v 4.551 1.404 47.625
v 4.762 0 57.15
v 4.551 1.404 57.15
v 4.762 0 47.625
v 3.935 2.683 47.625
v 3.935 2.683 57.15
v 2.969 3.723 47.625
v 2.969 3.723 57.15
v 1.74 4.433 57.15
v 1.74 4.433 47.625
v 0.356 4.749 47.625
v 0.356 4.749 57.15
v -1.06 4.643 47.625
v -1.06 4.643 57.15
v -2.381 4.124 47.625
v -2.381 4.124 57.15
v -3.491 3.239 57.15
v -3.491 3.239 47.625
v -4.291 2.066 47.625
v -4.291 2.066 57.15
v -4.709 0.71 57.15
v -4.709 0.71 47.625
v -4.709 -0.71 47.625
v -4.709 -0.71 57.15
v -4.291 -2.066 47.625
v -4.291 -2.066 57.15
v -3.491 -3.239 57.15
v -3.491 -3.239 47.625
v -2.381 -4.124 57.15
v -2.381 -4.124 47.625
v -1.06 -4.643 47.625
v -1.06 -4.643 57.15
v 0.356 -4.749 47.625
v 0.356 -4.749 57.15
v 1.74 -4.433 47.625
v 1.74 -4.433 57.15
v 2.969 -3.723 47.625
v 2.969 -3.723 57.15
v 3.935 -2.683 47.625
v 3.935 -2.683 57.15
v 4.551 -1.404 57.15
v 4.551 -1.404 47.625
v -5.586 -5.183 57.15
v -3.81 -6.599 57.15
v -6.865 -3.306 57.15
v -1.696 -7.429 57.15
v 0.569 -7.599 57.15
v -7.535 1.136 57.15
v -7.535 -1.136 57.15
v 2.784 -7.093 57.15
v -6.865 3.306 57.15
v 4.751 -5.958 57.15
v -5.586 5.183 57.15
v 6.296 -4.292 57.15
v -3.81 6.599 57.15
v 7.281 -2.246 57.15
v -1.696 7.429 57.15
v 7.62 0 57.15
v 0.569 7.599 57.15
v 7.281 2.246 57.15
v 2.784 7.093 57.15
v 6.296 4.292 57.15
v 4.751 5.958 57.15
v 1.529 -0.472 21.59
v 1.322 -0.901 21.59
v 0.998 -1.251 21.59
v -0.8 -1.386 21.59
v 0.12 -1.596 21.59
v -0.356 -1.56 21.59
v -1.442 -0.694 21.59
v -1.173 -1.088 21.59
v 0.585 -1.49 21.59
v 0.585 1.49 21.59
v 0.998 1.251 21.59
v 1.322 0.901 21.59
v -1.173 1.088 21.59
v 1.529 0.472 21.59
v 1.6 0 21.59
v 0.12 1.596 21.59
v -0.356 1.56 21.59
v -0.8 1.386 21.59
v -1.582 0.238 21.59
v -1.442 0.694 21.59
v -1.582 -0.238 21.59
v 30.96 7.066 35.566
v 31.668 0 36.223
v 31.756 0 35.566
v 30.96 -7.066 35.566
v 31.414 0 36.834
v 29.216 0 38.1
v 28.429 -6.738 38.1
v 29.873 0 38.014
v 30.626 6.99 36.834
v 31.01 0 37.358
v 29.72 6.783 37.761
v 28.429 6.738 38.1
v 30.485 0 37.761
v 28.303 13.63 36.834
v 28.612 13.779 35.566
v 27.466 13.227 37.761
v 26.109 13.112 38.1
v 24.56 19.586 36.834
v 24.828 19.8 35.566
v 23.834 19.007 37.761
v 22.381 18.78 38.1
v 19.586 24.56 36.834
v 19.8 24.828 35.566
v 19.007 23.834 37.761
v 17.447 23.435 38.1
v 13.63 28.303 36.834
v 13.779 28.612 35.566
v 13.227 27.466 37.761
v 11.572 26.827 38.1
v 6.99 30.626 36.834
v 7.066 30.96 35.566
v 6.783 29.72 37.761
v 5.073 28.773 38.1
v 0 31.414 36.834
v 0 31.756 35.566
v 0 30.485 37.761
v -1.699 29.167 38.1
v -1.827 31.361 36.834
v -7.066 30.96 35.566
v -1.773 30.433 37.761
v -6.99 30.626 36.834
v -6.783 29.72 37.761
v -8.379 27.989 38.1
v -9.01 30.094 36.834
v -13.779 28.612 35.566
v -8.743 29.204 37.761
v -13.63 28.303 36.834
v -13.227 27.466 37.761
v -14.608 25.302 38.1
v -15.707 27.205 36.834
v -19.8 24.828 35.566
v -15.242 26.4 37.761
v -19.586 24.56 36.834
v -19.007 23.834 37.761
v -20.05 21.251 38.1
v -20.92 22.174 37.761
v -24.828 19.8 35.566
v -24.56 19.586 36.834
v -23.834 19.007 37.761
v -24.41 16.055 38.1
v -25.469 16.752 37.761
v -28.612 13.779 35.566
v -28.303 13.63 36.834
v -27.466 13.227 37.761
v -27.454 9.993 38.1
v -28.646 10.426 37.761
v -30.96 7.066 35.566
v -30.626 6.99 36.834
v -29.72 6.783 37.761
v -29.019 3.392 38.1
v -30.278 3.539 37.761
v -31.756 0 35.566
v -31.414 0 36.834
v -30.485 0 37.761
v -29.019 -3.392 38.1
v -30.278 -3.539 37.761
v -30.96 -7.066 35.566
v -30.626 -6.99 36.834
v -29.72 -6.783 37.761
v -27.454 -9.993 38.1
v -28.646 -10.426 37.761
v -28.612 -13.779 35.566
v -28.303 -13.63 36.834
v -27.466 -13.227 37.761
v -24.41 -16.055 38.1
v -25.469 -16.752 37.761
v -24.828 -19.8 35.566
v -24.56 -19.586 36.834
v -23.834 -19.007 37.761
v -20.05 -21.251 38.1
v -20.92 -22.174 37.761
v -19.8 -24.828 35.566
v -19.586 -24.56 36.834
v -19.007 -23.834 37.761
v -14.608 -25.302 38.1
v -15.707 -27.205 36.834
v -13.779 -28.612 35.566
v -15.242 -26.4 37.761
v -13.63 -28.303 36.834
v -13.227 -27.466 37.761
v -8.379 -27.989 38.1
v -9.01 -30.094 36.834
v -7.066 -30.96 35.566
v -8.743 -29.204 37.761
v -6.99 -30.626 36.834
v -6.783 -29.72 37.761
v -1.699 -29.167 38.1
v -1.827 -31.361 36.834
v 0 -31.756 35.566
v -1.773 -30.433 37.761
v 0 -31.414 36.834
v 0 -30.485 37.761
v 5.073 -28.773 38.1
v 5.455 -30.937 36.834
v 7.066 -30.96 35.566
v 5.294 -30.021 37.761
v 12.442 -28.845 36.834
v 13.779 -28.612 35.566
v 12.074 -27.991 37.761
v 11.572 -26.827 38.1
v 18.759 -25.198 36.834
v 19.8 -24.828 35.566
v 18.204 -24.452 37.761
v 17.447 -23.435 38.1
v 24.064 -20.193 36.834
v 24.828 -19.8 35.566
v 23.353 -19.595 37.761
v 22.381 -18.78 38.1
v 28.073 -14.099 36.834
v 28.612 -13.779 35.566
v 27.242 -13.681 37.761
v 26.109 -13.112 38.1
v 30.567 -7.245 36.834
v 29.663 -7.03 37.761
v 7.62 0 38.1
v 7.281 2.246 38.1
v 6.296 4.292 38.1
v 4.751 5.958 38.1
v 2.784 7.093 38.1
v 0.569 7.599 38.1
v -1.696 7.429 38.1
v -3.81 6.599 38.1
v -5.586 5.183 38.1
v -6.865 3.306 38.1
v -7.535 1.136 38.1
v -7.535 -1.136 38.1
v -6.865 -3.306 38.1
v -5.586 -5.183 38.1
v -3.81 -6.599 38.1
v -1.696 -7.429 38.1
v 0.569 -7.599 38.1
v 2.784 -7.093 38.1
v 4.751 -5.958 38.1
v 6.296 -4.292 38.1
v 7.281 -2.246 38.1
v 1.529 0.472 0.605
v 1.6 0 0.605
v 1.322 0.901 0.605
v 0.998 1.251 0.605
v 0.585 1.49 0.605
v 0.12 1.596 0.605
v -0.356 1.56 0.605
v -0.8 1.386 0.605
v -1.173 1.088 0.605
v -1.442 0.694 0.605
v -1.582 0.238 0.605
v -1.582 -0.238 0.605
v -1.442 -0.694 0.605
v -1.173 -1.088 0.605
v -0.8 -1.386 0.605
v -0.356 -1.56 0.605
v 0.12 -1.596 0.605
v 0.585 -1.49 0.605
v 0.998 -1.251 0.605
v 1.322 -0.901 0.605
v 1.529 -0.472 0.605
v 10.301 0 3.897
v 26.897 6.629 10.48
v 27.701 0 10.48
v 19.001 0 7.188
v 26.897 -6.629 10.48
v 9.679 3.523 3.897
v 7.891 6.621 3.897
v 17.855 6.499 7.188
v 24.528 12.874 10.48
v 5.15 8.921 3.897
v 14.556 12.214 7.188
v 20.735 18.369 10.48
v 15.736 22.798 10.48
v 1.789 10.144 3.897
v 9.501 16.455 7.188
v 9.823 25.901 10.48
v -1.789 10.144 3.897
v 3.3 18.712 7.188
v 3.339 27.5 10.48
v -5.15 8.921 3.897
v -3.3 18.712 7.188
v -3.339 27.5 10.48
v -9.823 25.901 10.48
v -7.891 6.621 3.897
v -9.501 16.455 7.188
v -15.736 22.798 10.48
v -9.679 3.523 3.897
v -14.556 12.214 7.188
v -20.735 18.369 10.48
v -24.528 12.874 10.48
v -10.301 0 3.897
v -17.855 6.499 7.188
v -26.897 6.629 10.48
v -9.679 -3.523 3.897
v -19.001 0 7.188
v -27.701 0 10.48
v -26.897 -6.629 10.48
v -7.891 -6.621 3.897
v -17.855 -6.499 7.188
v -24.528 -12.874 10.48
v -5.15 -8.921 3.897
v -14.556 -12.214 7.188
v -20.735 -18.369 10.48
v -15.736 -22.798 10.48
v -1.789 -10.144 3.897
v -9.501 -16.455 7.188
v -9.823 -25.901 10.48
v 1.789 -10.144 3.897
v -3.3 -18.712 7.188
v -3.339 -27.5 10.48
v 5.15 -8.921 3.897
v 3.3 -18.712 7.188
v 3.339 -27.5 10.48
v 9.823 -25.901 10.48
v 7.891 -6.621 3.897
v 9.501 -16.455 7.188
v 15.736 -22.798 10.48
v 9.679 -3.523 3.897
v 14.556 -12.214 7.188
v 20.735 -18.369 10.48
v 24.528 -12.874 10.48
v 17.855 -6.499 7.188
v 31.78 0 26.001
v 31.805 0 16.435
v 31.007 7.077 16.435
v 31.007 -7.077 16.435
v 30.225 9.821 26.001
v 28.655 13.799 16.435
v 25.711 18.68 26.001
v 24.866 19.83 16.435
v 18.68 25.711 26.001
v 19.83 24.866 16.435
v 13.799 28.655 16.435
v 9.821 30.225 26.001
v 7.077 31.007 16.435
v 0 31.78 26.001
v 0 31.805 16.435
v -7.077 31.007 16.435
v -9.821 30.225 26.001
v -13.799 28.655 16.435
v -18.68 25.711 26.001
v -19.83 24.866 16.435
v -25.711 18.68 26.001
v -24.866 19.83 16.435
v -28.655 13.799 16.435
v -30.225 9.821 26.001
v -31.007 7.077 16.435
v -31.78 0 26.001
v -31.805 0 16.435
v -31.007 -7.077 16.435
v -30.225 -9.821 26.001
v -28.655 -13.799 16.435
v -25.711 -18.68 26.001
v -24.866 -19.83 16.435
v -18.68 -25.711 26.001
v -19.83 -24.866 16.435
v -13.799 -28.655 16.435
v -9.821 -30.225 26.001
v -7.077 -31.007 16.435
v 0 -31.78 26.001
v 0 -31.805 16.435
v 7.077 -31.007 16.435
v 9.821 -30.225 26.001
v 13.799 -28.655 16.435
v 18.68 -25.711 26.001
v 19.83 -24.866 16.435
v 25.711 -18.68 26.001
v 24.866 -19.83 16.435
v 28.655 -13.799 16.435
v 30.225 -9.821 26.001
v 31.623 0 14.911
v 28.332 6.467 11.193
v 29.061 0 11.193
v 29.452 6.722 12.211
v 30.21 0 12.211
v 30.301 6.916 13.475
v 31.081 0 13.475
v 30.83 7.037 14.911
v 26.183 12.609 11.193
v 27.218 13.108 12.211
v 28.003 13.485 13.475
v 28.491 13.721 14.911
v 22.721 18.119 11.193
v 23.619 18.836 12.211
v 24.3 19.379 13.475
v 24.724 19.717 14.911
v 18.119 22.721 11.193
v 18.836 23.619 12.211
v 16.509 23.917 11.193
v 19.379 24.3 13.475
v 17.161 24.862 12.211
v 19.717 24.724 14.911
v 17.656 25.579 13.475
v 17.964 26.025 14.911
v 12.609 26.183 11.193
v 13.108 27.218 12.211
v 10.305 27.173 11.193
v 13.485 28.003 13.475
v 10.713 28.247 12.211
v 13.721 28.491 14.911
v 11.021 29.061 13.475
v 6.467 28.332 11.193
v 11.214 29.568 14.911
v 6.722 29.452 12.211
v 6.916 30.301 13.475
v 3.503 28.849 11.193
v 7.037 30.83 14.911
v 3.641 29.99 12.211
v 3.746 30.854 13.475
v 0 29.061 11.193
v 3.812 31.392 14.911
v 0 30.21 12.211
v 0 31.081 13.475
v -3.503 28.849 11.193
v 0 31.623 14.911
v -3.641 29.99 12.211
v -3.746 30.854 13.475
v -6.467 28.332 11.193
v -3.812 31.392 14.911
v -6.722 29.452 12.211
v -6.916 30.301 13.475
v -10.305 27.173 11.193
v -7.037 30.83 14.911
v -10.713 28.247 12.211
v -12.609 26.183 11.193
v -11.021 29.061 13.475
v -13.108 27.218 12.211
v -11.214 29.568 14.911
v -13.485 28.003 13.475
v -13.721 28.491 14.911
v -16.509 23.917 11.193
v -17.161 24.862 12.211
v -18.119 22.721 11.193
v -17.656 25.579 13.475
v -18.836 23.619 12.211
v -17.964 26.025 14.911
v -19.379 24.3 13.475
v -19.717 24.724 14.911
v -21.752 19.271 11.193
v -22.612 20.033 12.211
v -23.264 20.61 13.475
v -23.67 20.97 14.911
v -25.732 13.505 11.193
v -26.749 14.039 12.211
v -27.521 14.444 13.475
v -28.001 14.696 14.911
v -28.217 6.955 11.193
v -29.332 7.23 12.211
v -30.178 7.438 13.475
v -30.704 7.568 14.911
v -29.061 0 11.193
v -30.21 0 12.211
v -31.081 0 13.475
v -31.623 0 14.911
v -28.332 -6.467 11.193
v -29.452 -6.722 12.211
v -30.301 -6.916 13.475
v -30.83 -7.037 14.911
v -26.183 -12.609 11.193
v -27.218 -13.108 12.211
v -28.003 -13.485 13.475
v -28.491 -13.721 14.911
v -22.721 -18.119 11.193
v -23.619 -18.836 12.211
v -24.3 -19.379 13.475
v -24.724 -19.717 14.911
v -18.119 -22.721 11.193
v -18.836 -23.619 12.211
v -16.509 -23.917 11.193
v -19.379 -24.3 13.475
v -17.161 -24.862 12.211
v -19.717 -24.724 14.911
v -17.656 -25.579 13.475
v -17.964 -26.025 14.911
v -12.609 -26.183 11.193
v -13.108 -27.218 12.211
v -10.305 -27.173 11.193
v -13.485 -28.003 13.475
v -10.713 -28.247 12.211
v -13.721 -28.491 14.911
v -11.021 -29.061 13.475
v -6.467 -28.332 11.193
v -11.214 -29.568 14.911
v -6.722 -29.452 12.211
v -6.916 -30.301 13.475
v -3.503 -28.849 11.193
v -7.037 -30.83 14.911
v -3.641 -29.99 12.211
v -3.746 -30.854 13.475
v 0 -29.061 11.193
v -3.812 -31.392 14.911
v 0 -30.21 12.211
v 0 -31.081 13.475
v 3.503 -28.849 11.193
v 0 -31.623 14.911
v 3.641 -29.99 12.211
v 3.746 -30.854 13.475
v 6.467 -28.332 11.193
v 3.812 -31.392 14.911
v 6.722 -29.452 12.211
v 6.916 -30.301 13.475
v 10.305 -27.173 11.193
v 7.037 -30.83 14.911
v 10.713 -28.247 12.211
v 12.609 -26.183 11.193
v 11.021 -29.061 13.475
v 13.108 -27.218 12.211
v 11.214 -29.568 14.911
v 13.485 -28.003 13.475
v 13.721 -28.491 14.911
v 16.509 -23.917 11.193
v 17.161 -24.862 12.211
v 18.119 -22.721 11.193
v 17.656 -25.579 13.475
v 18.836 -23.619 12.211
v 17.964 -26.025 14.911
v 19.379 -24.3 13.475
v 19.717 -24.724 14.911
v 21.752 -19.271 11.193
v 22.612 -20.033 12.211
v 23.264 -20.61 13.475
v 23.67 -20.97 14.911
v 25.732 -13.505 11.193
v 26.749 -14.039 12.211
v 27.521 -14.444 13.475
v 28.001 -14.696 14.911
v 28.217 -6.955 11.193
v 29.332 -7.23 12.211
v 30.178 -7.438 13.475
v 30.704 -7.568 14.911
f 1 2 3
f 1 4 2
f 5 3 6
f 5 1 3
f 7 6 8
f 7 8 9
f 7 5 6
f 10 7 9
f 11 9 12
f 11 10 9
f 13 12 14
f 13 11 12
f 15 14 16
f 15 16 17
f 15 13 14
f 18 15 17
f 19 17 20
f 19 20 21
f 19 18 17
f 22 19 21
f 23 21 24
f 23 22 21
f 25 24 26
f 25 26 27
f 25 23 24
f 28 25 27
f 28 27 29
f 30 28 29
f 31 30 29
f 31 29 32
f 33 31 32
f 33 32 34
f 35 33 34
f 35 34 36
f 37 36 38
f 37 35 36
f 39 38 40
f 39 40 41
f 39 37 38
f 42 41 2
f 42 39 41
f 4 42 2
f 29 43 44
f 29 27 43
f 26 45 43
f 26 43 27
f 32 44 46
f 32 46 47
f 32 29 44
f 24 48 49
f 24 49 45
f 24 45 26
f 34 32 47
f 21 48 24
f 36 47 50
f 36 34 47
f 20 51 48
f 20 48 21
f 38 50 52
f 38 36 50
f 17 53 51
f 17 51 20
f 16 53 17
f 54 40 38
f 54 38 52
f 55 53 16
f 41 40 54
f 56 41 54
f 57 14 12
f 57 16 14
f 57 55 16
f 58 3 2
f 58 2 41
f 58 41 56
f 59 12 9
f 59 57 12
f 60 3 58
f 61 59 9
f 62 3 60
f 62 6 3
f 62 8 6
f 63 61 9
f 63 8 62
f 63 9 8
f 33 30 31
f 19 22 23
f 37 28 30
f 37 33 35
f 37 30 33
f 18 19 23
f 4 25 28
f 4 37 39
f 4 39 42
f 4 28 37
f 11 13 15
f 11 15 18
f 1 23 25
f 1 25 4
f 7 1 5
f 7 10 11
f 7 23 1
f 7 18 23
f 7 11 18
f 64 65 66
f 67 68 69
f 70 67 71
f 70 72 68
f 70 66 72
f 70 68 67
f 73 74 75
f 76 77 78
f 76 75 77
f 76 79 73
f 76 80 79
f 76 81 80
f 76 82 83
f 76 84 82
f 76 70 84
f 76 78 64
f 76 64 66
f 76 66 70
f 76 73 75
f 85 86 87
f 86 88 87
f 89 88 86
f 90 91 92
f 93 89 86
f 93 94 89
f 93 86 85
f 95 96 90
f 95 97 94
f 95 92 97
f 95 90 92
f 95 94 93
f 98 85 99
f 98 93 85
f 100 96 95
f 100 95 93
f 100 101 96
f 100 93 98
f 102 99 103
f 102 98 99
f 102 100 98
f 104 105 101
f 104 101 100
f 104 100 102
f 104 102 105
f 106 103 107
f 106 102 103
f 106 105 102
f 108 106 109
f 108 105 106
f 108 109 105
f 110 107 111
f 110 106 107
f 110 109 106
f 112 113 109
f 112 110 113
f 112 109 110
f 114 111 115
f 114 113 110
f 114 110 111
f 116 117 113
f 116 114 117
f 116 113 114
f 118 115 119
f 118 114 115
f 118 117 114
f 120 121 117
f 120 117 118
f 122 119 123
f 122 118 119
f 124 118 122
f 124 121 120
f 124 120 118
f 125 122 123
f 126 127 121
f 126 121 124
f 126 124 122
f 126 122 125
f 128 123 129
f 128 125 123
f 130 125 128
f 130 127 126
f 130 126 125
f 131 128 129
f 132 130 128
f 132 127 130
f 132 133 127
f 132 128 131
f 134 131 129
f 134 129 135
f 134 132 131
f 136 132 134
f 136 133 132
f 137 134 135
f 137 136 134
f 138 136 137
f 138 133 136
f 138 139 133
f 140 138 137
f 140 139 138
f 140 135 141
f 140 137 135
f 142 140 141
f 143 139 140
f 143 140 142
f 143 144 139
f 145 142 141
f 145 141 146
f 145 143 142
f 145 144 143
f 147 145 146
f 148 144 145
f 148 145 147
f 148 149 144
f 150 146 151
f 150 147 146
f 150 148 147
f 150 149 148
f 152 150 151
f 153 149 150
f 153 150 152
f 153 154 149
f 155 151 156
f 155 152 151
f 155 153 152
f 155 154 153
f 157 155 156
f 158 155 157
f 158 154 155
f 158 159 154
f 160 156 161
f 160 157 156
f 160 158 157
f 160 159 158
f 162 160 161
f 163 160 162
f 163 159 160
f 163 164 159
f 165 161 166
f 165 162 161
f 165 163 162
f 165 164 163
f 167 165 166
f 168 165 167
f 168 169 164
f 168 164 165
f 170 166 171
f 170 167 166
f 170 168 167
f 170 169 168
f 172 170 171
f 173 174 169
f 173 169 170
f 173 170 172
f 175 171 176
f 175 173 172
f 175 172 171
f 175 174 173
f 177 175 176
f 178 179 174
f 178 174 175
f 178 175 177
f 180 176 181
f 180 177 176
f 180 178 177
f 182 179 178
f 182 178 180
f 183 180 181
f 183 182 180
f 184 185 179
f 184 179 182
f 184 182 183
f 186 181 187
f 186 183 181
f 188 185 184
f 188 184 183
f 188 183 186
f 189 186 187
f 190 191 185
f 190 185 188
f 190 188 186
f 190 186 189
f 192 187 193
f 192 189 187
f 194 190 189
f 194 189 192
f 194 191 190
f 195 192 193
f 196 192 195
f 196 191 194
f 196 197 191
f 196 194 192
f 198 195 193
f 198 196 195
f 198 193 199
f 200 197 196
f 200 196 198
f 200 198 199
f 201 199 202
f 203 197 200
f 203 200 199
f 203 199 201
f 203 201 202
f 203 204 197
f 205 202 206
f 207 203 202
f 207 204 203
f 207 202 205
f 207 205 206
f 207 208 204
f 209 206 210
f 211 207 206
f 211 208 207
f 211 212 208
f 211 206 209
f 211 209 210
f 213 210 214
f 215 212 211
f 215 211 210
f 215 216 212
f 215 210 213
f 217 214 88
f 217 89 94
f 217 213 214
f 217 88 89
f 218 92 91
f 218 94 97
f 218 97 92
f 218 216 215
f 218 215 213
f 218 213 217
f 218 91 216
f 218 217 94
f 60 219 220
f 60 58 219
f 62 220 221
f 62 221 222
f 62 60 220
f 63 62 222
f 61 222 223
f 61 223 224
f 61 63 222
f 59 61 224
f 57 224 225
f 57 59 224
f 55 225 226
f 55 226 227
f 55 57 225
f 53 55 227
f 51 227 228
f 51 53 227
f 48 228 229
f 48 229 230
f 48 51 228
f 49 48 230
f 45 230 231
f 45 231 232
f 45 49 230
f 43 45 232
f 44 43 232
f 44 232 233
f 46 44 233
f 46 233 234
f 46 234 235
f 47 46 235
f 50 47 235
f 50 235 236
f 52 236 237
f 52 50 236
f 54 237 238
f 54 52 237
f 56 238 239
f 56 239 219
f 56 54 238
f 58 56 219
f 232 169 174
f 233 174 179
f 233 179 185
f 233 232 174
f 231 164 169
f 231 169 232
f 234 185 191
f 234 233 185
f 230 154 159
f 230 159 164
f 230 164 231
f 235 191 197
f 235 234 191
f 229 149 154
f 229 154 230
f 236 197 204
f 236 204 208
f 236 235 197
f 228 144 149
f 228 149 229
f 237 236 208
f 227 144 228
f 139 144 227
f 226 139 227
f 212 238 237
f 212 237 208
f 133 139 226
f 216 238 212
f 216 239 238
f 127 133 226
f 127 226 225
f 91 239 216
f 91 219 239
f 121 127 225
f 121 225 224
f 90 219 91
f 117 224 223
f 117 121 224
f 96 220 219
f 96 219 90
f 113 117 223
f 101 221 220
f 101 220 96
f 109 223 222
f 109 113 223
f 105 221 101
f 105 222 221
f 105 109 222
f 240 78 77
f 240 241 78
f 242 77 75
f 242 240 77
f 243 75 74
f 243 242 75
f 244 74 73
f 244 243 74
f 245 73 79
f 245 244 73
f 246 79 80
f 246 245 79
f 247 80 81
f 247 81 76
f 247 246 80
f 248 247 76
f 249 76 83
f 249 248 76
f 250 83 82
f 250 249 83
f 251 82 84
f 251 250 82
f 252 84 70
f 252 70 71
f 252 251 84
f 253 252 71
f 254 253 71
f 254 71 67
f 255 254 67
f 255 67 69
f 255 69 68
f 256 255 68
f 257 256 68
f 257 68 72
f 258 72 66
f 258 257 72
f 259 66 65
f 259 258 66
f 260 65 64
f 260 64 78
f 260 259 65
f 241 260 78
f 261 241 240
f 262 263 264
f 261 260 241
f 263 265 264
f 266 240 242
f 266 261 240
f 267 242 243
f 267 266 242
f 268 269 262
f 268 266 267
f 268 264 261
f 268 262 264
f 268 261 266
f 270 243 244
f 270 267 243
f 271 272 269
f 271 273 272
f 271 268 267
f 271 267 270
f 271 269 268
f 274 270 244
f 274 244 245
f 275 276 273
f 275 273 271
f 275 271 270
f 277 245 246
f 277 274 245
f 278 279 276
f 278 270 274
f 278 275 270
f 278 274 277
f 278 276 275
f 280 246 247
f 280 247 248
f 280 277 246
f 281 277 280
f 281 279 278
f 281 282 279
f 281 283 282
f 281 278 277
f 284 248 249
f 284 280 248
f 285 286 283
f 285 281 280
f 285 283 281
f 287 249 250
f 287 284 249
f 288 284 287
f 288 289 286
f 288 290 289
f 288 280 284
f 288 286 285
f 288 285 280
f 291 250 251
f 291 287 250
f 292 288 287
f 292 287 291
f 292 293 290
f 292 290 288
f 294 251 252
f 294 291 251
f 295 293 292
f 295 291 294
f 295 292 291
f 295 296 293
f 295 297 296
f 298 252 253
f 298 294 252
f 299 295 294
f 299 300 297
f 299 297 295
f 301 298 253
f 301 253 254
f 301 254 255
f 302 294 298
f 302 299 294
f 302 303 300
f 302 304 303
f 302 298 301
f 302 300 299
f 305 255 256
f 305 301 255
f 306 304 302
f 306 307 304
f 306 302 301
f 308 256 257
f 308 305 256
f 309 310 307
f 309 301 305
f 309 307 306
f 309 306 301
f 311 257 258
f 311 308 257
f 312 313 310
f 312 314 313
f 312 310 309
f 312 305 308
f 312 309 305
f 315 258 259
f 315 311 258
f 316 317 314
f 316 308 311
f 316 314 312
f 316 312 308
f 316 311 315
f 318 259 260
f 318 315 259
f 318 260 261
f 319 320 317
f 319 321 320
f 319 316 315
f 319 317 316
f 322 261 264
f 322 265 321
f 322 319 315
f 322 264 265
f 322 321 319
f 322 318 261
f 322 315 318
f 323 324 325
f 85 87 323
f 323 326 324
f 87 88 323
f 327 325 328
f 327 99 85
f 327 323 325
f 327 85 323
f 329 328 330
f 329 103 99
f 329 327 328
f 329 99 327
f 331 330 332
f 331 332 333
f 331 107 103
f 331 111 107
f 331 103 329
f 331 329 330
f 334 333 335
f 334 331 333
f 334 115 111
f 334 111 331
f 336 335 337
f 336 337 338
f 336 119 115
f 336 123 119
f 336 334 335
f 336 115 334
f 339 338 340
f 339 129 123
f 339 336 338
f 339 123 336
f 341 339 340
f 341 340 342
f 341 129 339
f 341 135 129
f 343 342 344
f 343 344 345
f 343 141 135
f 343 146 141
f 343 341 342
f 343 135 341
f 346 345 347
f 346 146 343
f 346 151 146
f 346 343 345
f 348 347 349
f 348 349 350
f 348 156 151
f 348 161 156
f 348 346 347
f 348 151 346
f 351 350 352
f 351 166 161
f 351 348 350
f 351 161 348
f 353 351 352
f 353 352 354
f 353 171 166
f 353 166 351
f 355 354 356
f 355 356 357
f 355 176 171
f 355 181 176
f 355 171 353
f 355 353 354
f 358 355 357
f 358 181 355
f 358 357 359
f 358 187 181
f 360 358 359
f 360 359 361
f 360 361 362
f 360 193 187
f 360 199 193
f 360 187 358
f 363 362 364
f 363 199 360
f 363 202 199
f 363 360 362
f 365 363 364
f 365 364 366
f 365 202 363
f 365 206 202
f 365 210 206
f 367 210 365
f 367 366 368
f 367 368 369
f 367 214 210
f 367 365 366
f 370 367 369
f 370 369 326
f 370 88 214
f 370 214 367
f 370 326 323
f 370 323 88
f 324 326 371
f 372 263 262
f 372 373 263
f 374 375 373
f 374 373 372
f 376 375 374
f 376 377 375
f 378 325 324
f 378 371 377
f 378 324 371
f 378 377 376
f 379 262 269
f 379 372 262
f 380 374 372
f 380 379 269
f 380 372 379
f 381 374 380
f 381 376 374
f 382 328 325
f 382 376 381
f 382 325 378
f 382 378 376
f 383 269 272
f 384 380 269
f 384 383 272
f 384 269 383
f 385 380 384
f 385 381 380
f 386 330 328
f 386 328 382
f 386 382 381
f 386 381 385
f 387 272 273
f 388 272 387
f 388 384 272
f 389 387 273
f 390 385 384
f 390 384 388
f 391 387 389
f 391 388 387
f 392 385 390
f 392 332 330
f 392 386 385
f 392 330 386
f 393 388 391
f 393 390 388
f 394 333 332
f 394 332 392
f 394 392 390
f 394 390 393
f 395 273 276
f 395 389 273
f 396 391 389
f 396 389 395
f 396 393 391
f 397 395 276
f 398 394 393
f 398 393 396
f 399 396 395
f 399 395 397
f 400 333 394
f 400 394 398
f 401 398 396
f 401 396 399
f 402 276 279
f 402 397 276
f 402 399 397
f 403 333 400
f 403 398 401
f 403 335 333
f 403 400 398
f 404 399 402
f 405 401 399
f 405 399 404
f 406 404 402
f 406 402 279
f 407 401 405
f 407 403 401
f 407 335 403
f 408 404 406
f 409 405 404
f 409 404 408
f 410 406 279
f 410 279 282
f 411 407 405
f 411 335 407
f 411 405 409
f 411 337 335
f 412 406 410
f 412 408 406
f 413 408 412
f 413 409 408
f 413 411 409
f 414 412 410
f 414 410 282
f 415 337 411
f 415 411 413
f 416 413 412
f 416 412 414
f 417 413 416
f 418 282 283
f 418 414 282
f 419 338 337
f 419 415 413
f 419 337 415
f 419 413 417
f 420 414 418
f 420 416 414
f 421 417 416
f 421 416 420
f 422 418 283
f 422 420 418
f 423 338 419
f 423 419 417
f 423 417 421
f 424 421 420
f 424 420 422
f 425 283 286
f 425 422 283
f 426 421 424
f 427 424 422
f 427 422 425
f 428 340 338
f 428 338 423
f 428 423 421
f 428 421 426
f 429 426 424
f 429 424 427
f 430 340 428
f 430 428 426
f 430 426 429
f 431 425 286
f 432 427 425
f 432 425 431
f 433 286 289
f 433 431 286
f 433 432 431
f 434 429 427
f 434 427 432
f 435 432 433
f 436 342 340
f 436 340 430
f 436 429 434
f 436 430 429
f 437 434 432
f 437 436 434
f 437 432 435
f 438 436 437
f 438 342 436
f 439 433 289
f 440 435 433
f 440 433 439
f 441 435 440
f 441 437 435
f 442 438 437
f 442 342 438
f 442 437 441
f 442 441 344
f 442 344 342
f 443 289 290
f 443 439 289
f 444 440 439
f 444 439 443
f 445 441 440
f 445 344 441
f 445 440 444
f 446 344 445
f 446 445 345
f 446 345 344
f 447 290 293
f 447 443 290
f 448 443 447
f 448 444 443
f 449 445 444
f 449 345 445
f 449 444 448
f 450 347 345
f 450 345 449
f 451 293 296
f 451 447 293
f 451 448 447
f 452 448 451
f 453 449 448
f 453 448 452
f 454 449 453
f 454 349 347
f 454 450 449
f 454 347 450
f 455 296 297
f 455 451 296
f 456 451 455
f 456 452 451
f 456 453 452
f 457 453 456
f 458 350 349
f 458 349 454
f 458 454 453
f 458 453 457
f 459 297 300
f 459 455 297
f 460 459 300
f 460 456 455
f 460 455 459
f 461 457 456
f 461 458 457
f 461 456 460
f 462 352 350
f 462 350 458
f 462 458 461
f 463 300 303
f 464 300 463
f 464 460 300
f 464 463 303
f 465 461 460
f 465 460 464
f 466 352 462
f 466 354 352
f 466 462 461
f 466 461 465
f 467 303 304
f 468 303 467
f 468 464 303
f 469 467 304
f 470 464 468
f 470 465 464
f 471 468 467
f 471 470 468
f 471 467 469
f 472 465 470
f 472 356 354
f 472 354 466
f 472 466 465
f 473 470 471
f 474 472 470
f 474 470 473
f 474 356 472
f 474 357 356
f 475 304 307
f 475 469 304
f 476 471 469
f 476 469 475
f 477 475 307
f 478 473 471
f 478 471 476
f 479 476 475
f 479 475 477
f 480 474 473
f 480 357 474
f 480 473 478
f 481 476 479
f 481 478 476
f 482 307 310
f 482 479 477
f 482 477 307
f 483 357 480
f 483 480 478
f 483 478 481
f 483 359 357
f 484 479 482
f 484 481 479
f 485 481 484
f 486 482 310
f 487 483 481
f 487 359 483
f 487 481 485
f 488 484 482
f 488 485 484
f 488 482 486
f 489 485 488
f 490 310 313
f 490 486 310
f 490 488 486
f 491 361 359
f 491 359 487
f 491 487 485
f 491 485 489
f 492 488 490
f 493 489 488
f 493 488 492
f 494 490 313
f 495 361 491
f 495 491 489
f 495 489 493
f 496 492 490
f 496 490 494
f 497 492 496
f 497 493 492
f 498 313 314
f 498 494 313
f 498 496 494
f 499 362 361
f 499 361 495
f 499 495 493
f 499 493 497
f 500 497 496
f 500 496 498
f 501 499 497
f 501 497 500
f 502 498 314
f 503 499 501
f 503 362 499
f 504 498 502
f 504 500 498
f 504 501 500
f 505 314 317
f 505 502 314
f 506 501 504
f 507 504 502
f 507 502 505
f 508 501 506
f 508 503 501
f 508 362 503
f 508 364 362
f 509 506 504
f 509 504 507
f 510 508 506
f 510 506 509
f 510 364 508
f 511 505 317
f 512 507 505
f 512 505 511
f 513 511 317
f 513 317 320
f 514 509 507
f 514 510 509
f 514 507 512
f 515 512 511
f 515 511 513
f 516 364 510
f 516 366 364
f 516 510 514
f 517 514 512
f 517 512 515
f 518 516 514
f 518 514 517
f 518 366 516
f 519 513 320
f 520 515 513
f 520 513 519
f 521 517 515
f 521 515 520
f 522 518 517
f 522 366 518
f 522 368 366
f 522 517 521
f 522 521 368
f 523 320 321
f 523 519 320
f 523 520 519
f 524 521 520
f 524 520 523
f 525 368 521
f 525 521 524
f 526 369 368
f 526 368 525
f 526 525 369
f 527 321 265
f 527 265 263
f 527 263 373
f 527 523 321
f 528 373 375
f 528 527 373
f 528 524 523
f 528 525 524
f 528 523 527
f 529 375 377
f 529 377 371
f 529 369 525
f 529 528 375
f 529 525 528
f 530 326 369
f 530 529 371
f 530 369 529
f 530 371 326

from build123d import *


# Not quite as in the source:
# - a feature names something its author has since deleted; it is built from what else it names


with BuildPart() as f1:
    # F0 (on Front) → F1 (revolve)
    with BuildSketch(Plane.XZ):
        with BuildLine():
            Line((0, 47.625), (0, 21.59))
            Line((0, 21.59), (1.6002, 21.59))
            Line((1.6002, 21.59), (1.6002, 0.6053799298))
            Line((1.6002, 0.6053799298), (27.7014960486, 10.4798960957))
            ThreePointArc((27.7014960486, 10.4798960957), (30.6836253917, 12.8163260486), (31.8045894836, 16.435088247))
            Line((31.8045894836, 16.435088247), (31.7563839592, 35.5664000652))
            ThreePointArc((31.7563839592, 35.5664000652), (31.0101790546, 37.3583125654), (29.2163920223, 38.1))
            Line((29.2163920223, 38.1), (7.62, 38.1))
            Line((7.62, 38.1), (7.62, 57.15))
            Line((7.62, 57.15), (4.7625, 57.15))
            Line((4.7625, 57.15), (4.7625, 47.625))
            Line((4.7625, 47.625), (0, 47.625))
        make_face()
    revolve(axis=Axis((0, 0, 28.575), (0, 0, 1)))


solid = f1.part
